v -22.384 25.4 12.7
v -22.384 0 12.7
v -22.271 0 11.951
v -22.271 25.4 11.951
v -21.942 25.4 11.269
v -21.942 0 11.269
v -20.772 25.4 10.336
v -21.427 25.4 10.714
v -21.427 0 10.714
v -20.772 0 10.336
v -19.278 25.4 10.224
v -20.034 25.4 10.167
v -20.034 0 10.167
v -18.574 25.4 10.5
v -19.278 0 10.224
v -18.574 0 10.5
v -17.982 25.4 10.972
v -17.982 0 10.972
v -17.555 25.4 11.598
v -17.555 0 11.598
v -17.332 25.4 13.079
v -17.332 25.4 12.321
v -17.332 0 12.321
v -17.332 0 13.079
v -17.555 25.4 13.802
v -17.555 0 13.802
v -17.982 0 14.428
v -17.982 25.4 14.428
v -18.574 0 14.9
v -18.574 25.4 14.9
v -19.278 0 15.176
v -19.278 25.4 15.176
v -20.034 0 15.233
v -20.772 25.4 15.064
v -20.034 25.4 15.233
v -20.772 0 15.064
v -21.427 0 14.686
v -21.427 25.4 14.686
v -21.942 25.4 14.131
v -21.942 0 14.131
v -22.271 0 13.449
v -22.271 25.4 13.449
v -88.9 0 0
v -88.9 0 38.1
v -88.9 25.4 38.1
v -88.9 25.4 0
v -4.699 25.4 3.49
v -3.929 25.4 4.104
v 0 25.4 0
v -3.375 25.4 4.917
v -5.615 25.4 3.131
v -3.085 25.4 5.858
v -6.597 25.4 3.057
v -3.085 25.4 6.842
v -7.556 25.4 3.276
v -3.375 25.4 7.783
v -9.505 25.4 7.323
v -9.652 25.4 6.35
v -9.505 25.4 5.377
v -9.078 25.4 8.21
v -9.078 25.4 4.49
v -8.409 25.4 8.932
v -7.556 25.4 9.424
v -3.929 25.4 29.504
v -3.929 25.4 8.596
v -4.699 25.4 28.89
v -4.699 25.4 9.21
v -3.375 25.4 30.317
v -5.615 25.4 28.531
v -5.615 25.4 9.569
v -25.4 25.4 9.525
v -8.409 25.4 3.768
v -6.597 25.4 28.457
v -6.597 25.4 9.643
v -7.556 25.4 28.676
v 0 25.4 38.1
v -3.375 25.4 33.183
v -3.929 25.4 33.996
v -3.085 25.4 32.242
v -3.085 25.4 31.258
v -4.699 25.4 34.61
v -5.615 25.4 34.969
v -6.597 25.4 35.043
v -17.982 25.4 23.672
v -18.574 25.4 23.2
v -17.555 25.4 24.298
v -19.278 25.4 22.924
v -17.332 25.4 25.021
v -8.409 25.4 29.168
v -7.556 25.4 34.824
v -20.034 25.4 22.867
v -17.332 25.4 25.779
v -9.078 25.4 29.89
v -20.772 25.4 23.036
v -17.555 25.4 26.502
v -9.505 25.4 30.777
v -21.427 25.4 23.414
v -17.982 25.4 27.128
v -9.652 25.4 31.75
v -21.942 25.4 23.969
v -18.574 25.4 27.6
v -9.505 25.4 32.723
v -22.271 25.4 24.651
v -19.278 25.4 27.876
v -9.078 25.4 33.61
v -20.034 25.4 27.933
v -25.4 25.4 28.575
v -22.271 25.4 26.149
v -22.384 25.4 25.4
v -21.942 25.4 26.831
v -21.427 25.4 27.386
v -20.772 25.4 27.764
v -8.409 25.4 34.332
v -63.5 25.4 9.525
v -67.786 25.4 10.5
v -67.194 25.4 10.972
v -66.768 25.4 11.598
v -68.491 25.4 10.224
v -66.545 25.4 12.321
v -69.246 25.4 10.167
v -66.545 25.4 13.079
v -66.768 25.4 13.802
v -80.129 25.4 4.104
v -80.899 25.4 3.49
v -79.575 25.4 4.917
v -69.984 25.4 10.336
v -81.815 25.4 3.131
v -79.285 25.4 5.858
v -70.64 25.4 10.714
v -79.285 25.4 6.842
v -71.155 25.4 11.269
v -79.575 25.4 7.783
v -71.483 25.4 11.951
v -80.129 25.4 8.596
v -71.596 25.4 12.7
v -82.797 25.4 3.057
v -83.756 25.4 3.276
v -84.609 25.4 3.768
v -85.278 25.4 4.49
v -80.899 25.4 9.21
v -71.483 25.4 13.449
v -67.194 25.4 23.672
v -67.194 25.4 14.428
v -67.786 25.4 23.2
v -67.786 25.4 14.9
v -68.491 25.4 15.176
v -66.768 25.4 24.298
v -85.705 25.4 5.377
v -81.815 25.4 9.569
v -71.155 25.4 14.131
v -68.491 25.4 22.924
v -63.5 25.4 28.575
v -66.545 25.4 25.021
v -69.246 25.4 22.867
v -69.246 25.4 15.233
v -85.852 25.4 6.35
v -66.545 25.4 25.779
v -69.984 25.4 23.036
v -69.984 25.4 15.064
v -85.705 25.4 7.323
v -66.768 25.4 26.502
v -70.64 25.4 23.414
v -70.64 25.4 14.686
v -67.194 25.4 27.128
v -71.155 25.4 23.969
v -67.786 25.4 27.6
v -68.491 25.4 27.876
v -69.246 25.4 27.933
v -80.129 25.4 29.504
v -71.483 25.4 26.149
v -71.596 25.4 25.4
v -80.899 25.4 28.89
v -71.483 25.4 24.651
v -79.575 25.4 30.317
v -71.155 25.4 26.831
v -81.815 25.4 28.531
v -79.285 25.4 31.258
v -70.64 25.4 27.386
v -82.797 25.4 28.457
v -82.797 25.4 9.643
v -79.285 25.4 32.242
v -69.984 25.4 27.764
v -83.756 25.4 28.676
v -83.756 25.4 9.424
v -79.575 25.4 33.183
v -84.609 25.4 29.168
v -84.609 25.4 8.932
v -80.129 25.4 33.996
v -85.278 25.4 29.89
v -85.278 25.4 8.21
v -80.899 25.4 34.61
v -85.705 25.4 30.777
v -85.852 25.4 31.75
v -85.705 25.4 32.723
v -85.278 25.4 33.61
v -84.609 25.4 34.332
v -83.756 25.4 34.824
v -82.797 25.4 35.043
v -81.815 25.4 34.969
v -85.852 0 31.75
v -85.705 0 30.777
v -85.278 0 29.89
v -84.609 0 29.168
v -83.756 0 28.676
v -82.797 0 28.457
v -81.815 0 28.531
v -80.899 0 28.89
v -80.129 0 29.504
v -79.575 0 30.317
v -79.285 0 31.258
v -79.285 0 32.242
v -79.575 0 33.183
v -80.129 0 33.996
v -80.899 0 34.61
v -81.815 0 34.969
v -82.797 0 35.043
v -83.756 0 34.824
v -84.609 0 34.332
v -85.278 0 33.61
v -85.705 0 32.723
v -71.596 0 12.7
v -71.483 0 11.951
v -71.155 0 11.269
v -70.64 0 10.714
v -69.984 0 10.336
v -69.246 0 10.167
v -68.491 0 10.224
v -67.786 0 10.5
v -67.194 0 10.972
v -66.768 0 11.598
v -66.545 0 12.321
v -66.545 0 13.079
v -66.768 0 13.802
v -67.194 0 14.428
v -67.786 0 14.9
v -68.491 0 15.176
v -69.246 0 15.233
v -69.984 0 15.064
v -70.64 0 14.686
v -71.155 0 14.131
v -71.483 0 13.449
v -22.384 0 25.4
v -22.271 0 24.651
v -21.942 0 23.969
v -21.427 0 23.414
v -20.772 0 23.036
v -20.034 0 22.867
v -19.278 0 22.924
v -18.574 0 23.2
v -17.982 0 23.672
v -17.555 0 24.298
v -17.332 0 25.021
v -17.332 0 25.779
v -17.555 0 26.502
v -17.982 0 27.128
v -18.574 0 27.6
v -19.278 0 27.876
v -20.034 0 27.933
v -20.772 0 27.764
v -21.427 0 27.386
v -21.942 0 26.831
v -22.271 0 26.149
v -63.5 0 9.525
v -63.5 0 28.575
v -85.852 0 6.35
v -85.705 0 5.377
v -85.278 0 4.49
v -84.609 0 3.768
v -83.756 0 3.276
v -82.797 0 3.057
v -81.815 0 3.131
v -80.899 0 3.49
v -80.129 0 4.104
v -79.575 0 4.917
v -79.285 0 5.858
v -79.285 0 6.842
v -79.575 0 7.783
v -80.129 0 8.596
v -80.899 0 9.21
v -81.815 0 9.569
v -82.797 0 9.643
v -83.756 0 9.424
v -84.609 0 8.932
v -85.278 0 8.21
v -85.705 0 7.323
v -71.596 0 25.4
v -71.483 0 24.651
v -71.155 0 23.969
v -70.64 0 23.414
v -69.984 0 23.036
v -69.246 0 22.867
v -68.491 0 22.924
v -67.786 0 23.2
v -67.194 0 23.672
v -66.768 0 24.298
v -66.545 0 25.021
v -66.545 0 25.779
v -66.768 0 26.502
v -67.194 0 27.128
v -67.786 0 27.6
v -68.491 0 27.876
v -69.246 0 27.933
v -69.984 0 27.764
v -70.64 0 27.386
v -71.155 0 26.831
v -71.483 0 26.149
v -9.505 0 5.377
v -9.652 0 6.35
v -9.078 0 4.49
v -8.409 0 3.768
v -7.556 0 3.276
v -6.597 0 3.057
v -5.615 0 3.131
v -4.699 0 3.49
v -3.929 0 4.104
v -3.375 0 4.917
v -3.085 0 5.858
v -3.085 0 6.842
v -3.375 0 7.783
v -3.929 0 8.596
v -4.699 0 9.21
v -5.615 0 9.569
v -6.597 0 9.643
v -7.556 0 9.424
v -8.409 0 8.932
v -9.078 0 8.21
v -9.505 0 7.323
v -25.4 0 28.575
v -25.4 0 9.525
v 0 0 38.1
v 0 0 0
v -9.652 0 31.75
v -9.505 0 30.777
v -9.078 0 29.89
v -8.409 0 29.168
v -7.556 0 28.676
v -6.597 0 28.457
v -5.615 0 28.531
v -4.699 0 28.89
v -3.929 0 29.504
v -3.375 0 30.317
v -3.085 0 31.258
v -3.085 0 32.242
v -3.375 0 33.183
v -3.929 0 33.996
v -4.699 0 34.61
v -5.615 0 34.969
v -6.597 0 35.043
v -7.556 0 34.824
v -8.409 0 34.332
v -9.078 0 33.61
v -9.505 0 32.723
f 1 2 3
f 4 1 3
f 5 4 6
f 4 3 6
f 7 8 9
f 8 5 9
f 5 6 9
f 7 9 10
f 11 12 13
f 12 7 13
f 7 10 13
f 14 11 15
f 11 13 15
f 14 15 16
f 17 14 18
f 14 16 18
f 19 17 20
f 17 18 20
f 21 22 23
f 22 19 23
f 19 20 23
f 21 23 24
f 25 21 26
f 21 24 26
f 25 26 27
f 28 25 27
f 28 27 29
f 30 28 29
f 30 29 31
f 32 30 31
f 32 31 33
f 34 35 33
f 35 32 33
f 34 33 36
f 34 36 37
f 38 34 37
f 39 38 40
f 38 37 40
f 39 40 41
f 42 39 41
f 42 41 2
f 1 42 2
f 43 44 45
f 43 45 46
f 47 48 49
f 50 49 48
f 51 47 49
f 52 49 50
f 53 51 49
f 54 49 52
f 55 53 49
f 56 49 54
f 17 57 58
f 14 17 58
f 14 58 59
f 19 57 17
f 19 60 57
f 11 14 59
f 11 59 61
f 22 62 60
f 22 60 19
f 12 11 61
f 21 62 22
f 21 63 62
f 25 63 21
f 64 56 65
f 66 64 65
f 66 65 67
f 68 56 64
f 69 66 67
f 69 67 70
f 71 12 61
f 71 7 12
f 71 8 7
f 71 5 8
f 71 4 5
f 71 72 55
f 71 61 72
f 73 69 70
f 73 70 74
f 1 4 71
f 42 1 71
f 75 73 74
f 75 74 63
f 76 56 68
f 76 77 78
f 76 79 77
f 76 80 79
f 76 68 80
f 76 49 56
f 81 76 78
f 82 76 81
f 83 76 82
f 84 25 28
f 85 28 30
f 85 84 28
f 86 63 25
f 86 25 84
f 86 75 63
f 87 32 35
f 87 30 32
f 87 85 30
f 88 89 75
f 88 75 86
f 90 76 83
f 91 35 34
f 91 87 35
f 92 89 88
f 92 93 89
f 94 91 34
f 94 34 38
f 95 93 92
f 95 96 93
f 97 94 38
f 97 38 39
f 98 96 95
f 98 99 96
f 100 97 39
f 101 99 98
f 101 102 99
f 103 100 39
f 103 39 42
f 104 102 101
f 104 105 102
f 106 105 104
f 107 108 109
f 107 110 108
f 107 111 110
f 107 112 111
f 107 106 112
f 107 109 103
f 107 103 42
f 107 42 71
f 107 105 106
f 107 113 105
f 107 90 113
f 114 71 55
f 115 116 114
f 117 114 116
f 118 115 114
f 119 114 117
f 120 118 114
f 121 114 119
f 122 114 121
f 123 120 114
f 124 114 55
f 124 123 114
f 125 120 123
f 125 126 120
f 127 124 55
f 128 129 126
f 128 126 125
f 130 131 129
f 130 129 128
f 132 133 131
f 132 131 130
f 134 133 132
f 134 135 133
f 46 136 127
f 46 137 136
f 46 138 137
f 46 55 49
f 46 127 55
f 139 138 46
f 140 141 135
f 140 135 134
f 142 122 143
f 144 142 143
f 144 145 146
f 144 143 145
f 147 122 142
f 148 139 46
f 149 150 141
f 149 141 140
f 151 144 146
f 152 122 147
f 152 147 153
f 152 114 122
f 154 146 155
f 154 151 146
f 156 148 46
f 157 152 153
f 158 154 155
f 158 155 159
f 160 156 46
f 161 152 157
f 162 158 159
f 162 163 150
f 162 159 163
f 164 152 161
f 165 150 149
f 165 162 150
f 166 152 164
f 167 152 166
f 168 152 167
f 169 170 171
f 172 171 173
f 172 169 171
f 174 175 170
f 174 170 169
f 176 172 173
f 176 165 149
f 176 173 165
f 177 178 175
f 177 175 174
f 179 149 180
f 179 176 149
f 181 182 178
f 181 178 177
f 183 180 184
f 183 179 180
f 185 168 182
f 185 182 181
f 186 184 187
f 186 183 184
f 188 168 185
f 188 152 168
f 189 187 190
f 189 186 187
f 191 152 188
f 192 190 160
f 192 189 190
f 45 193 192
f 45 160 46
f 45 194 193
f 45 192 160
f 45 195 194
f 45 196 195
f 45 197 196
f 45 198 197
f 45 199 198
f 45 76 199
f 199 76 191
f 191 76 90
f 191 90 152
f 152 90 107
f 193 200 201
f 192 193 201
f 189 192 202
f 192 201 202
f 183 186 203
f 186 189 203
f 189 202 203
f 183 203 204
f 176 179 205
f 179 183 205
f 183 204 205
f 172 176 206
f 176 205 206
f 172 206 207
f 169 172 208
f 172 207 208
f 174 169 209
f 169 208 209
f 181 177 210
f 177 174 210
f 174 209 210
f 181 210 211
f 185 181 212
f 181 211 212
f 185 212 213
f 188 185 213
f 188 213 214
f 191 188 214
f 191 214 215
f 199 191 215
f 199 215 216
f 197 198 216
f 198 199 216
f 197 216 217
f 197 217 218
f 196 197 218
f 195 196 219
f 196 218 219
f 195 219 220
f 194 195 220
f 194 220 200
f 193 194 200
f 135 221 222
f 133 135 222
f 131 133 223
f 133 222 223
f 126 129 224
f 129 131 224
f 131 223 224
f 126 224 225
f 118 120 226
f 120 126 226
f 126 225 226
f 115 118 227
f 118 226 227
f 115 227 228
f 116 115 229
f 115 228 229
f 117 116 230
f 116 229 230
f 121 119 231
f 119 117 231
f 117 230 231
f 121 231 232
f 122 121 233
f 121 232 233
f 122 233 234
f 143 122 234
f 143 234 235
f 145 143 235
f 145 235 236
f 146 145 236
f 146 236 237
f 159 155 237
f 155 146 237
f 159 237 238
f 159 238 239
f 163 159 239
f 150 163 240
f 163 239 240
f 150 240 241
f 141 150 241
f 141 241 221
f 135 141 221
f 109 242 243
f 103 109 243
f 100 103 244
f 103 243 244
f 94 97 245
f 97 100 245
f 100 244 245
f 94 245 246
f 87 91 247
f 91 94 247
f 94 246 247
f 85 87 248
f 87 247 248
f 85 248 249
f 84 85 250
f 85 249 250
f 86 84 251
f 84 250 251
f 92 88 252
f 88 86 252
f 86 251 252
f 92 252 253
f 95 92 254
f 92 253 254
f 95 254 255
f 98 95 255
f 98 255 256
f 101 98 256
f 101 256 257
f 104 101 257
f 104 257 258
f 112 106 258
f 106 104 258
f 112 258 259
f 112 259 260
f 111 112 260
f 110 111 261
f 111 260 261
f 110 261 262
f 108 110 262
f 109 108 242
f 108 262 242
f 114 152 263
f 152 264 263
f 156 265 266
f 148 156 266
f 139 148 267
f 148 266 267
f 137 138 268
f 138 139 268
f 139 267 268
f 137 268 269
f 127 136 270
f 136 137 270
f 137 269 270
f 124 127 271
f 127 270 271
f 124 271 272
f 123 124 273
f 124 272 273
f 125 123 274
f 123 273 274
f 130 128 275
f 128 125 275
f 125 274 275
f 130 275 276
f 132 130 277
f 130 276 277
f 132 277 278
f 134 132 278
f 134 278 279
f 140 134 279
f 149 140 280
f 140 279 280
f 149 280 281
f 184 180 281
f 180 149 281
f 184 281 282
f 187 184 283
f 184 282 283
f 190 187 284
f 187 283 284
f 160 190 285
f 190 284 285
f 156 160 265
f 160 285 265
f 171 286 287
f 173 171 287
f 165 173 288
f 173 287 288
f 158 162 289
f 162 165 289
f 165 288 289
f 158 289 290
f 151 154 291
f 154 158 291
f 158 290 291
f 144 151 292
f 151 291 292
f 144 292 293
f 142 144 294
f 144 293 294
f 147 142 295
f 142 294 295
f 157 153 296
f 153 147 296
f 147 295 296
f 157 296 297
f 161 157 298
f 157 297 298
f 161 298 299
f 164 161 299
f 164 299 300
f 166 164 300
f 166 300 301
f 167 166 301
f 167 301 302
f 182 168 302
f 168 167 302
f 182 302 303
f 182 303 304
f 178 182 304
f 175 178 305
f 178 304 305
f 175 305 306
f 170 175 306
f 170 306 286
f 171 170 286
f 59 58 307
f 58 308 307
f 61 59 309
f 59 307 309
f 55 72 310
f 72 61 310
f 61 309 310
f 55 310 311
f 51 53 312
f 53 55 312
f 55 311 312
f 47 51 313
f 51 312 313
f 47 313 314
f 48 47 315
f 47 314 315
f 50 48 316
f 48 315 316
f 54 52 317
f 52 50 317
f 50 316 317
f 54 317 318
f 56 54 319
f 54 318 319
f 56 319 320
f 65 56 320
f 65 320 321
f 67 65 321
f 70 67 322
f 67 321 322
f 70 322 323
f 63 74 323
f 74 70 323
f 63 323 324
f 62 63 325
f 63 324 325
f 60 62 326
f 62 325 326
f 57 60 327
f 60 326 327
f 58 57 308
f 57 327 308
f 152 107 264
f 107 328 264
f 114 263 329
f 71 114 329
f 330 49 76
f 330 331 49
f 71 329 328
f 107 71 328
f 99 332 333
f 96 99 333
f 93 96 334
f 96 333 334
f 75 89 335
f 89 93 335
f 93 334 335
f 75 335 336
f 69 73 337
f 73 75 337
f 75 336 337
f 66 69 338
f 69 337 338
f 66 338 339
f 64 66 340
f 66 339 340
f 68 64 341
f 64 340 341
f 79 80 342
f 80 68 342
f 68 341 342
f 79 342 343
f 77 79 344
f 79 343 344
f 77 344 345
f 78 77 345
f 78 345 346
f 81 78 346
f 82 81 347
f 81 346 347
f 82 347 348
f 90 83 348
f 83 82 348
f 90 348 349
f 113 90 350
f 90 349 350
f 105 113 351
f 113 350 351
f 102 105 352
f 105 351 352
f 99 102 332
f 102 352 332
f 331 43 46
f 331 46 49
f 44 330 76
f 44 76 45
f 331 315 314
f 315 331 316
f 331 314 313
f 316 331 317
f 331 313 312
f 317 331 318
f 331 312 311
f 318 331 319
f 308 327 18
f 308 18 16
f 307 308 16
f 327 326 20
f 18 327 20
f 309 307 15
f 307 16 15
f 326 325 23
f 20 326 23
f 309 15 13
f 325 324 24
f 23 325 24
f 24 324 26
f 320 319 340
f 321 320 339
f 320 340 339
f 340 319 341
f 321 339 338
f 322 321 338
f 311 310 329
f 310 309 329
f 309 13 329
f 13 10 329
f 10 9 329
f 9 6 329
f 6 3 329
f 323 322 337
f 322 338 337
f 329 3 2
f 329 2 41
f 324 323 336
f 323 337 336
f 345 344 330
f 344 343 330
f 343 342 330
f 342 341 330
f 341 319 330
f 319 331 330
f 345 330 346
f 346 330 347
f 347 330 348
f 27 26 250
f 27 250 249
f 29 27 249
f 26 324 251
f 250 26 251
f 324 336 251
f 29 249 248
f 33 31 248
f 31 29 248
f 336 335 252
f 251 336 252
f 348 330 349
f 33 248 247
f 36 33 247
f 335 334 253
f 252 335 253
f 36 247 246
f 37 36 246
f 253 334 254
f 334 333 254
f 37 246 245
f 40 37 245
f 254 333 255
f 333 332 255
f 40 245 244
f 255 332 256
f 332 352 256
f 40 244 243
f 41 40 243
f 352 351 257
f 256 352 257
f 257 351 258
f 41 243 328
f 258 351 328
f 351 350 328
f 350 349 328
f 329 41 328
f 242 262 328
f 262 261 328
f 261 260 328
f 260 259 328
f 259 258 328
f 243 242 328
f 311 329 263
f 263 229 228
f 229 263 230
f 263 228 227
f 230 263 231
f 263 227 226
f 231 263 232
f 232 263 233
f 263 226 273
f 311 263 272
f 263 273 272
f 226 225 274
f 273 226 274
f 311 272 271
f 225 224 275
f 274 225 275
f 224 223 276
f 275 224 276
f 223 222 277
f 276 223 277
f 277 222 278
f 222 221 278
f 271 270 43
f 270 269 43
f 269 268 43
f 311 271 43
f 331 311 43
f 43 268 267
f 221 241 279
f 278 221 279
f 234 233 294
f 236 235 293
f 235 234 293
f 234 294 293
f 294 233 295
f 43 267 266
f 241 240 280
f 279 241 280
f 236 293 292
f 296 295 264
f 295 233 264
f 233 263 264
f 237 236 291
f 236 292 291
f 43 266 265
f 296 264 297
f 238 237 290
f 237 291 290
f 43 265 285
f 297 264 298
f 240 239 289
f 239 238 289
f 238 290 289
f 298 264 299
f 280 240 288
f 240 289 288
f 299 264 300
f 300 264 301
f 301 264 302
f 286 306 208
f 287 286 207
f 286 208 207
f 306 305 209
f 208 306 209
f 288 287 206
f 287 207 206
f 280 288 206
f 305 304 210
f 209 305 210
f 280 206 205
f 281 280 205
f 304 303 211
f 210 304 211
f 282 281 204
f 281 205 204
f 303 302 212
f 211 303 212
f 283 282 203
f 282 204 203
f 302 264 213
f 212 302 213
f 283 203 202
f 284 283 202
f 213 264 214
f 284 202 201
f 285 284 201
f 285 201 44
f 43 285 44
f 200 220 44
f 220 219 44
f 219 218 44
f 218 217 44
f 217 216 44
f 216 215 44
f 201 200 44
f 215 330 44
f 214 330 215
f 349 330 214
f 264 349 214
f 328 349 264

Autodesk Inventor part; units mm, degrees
ref_plane "YZ Plane" through (0, 0, 0) normal (1, 0, 0) x (0, 1, 0)
ref_plane "XZ Plane" through (0, 0, 0) normal (0, 1, 0) x (-1, 0, 0)
ref_plane "XY Plane" through (0, 0, 0) normal (0, 0, 1) x (1, 0, 0)
sketch "Sketch1" plane through (0, 0, 0) normal (0, 1, 0) x (-1, 0, 0)
  line L0 (0, 0) -> (0, 38.1)
  line L1 (0, 38.1) -> (88.9, 38.1)
  line L2 (88.9, 38.1) -> (88.9, 0)
  line L3 (88.9, 0) -> (0, 0)
  circle A0 centre (19.8437, 12.7) radius 2.54
  circle A1 centre (19.8437, 25.4) radius 2.54
  circle A2 centre (69.0563, 25.4) radius 2.54
  circle A3 centre (69.0563, 12.7) radius 2.54
  circle A4 centre (6.35, 31.75) radius 3.302
  circle A5 centre (6.35, 6.35) radius 3.302
  circle A6 centre (82.55, 31.75) radius 3.302
  circle A7 centre (82.55, 6.35) radius 3.302
  line L4 (63.5, 28.575) -> (63.5, 9.525)
  line L5 (63.5, 9.525) -> (25.4, 9.525)
  line L6 (25.4, 9.525) -> (25.4, 28.575)
  line L7 (25.4, 28.575) -> (63.5, 28.575)
  dimension "d0" = 38.1
  dimension "d1" = 88.9
  dimension "d2" = 5.08
  dimension "d3" = 5.08
  dimension "d4" = 5.08
  dimension "d5" = 5.08
  dimension "d6" = 12.7
  dimension "d7" = 12.7
  dimension "d8" = 12.7
  dimension "d9" = 12.7
  dimension "d10" = 49.2125
  dimension "d11" = 49.2125
  dimension "d12" = 19.8438
  dimension "d14" = 19.8438
  dimension "d15" = 6.604
  dimension "d16" = 6.604
  dimension "d17" = 6.604
  dimension "d18" = 6.604
  dimension "d19" = 25.4
  dimension "d20" = 6.35
  dimension "d21" = 6.35
  dimension "d22" = 6.35
  dimension "d23" = 6.35
  dimension "d24" = 6.35
  dimension "d25" = 25.4
  dimension "d26" = 6.35
  dimension "d27" = 19.05
  dimension "d28" = 38.1
  dimension "d29" = 9.525
  dimension "d30" = 25.4
  dimension "d33" = 6.35
  dimension "d34" = 76.2
extrude "Extrusion1" add sketch "Sketch1" along normal blind 25.4
properties part number "MotorHolder"
